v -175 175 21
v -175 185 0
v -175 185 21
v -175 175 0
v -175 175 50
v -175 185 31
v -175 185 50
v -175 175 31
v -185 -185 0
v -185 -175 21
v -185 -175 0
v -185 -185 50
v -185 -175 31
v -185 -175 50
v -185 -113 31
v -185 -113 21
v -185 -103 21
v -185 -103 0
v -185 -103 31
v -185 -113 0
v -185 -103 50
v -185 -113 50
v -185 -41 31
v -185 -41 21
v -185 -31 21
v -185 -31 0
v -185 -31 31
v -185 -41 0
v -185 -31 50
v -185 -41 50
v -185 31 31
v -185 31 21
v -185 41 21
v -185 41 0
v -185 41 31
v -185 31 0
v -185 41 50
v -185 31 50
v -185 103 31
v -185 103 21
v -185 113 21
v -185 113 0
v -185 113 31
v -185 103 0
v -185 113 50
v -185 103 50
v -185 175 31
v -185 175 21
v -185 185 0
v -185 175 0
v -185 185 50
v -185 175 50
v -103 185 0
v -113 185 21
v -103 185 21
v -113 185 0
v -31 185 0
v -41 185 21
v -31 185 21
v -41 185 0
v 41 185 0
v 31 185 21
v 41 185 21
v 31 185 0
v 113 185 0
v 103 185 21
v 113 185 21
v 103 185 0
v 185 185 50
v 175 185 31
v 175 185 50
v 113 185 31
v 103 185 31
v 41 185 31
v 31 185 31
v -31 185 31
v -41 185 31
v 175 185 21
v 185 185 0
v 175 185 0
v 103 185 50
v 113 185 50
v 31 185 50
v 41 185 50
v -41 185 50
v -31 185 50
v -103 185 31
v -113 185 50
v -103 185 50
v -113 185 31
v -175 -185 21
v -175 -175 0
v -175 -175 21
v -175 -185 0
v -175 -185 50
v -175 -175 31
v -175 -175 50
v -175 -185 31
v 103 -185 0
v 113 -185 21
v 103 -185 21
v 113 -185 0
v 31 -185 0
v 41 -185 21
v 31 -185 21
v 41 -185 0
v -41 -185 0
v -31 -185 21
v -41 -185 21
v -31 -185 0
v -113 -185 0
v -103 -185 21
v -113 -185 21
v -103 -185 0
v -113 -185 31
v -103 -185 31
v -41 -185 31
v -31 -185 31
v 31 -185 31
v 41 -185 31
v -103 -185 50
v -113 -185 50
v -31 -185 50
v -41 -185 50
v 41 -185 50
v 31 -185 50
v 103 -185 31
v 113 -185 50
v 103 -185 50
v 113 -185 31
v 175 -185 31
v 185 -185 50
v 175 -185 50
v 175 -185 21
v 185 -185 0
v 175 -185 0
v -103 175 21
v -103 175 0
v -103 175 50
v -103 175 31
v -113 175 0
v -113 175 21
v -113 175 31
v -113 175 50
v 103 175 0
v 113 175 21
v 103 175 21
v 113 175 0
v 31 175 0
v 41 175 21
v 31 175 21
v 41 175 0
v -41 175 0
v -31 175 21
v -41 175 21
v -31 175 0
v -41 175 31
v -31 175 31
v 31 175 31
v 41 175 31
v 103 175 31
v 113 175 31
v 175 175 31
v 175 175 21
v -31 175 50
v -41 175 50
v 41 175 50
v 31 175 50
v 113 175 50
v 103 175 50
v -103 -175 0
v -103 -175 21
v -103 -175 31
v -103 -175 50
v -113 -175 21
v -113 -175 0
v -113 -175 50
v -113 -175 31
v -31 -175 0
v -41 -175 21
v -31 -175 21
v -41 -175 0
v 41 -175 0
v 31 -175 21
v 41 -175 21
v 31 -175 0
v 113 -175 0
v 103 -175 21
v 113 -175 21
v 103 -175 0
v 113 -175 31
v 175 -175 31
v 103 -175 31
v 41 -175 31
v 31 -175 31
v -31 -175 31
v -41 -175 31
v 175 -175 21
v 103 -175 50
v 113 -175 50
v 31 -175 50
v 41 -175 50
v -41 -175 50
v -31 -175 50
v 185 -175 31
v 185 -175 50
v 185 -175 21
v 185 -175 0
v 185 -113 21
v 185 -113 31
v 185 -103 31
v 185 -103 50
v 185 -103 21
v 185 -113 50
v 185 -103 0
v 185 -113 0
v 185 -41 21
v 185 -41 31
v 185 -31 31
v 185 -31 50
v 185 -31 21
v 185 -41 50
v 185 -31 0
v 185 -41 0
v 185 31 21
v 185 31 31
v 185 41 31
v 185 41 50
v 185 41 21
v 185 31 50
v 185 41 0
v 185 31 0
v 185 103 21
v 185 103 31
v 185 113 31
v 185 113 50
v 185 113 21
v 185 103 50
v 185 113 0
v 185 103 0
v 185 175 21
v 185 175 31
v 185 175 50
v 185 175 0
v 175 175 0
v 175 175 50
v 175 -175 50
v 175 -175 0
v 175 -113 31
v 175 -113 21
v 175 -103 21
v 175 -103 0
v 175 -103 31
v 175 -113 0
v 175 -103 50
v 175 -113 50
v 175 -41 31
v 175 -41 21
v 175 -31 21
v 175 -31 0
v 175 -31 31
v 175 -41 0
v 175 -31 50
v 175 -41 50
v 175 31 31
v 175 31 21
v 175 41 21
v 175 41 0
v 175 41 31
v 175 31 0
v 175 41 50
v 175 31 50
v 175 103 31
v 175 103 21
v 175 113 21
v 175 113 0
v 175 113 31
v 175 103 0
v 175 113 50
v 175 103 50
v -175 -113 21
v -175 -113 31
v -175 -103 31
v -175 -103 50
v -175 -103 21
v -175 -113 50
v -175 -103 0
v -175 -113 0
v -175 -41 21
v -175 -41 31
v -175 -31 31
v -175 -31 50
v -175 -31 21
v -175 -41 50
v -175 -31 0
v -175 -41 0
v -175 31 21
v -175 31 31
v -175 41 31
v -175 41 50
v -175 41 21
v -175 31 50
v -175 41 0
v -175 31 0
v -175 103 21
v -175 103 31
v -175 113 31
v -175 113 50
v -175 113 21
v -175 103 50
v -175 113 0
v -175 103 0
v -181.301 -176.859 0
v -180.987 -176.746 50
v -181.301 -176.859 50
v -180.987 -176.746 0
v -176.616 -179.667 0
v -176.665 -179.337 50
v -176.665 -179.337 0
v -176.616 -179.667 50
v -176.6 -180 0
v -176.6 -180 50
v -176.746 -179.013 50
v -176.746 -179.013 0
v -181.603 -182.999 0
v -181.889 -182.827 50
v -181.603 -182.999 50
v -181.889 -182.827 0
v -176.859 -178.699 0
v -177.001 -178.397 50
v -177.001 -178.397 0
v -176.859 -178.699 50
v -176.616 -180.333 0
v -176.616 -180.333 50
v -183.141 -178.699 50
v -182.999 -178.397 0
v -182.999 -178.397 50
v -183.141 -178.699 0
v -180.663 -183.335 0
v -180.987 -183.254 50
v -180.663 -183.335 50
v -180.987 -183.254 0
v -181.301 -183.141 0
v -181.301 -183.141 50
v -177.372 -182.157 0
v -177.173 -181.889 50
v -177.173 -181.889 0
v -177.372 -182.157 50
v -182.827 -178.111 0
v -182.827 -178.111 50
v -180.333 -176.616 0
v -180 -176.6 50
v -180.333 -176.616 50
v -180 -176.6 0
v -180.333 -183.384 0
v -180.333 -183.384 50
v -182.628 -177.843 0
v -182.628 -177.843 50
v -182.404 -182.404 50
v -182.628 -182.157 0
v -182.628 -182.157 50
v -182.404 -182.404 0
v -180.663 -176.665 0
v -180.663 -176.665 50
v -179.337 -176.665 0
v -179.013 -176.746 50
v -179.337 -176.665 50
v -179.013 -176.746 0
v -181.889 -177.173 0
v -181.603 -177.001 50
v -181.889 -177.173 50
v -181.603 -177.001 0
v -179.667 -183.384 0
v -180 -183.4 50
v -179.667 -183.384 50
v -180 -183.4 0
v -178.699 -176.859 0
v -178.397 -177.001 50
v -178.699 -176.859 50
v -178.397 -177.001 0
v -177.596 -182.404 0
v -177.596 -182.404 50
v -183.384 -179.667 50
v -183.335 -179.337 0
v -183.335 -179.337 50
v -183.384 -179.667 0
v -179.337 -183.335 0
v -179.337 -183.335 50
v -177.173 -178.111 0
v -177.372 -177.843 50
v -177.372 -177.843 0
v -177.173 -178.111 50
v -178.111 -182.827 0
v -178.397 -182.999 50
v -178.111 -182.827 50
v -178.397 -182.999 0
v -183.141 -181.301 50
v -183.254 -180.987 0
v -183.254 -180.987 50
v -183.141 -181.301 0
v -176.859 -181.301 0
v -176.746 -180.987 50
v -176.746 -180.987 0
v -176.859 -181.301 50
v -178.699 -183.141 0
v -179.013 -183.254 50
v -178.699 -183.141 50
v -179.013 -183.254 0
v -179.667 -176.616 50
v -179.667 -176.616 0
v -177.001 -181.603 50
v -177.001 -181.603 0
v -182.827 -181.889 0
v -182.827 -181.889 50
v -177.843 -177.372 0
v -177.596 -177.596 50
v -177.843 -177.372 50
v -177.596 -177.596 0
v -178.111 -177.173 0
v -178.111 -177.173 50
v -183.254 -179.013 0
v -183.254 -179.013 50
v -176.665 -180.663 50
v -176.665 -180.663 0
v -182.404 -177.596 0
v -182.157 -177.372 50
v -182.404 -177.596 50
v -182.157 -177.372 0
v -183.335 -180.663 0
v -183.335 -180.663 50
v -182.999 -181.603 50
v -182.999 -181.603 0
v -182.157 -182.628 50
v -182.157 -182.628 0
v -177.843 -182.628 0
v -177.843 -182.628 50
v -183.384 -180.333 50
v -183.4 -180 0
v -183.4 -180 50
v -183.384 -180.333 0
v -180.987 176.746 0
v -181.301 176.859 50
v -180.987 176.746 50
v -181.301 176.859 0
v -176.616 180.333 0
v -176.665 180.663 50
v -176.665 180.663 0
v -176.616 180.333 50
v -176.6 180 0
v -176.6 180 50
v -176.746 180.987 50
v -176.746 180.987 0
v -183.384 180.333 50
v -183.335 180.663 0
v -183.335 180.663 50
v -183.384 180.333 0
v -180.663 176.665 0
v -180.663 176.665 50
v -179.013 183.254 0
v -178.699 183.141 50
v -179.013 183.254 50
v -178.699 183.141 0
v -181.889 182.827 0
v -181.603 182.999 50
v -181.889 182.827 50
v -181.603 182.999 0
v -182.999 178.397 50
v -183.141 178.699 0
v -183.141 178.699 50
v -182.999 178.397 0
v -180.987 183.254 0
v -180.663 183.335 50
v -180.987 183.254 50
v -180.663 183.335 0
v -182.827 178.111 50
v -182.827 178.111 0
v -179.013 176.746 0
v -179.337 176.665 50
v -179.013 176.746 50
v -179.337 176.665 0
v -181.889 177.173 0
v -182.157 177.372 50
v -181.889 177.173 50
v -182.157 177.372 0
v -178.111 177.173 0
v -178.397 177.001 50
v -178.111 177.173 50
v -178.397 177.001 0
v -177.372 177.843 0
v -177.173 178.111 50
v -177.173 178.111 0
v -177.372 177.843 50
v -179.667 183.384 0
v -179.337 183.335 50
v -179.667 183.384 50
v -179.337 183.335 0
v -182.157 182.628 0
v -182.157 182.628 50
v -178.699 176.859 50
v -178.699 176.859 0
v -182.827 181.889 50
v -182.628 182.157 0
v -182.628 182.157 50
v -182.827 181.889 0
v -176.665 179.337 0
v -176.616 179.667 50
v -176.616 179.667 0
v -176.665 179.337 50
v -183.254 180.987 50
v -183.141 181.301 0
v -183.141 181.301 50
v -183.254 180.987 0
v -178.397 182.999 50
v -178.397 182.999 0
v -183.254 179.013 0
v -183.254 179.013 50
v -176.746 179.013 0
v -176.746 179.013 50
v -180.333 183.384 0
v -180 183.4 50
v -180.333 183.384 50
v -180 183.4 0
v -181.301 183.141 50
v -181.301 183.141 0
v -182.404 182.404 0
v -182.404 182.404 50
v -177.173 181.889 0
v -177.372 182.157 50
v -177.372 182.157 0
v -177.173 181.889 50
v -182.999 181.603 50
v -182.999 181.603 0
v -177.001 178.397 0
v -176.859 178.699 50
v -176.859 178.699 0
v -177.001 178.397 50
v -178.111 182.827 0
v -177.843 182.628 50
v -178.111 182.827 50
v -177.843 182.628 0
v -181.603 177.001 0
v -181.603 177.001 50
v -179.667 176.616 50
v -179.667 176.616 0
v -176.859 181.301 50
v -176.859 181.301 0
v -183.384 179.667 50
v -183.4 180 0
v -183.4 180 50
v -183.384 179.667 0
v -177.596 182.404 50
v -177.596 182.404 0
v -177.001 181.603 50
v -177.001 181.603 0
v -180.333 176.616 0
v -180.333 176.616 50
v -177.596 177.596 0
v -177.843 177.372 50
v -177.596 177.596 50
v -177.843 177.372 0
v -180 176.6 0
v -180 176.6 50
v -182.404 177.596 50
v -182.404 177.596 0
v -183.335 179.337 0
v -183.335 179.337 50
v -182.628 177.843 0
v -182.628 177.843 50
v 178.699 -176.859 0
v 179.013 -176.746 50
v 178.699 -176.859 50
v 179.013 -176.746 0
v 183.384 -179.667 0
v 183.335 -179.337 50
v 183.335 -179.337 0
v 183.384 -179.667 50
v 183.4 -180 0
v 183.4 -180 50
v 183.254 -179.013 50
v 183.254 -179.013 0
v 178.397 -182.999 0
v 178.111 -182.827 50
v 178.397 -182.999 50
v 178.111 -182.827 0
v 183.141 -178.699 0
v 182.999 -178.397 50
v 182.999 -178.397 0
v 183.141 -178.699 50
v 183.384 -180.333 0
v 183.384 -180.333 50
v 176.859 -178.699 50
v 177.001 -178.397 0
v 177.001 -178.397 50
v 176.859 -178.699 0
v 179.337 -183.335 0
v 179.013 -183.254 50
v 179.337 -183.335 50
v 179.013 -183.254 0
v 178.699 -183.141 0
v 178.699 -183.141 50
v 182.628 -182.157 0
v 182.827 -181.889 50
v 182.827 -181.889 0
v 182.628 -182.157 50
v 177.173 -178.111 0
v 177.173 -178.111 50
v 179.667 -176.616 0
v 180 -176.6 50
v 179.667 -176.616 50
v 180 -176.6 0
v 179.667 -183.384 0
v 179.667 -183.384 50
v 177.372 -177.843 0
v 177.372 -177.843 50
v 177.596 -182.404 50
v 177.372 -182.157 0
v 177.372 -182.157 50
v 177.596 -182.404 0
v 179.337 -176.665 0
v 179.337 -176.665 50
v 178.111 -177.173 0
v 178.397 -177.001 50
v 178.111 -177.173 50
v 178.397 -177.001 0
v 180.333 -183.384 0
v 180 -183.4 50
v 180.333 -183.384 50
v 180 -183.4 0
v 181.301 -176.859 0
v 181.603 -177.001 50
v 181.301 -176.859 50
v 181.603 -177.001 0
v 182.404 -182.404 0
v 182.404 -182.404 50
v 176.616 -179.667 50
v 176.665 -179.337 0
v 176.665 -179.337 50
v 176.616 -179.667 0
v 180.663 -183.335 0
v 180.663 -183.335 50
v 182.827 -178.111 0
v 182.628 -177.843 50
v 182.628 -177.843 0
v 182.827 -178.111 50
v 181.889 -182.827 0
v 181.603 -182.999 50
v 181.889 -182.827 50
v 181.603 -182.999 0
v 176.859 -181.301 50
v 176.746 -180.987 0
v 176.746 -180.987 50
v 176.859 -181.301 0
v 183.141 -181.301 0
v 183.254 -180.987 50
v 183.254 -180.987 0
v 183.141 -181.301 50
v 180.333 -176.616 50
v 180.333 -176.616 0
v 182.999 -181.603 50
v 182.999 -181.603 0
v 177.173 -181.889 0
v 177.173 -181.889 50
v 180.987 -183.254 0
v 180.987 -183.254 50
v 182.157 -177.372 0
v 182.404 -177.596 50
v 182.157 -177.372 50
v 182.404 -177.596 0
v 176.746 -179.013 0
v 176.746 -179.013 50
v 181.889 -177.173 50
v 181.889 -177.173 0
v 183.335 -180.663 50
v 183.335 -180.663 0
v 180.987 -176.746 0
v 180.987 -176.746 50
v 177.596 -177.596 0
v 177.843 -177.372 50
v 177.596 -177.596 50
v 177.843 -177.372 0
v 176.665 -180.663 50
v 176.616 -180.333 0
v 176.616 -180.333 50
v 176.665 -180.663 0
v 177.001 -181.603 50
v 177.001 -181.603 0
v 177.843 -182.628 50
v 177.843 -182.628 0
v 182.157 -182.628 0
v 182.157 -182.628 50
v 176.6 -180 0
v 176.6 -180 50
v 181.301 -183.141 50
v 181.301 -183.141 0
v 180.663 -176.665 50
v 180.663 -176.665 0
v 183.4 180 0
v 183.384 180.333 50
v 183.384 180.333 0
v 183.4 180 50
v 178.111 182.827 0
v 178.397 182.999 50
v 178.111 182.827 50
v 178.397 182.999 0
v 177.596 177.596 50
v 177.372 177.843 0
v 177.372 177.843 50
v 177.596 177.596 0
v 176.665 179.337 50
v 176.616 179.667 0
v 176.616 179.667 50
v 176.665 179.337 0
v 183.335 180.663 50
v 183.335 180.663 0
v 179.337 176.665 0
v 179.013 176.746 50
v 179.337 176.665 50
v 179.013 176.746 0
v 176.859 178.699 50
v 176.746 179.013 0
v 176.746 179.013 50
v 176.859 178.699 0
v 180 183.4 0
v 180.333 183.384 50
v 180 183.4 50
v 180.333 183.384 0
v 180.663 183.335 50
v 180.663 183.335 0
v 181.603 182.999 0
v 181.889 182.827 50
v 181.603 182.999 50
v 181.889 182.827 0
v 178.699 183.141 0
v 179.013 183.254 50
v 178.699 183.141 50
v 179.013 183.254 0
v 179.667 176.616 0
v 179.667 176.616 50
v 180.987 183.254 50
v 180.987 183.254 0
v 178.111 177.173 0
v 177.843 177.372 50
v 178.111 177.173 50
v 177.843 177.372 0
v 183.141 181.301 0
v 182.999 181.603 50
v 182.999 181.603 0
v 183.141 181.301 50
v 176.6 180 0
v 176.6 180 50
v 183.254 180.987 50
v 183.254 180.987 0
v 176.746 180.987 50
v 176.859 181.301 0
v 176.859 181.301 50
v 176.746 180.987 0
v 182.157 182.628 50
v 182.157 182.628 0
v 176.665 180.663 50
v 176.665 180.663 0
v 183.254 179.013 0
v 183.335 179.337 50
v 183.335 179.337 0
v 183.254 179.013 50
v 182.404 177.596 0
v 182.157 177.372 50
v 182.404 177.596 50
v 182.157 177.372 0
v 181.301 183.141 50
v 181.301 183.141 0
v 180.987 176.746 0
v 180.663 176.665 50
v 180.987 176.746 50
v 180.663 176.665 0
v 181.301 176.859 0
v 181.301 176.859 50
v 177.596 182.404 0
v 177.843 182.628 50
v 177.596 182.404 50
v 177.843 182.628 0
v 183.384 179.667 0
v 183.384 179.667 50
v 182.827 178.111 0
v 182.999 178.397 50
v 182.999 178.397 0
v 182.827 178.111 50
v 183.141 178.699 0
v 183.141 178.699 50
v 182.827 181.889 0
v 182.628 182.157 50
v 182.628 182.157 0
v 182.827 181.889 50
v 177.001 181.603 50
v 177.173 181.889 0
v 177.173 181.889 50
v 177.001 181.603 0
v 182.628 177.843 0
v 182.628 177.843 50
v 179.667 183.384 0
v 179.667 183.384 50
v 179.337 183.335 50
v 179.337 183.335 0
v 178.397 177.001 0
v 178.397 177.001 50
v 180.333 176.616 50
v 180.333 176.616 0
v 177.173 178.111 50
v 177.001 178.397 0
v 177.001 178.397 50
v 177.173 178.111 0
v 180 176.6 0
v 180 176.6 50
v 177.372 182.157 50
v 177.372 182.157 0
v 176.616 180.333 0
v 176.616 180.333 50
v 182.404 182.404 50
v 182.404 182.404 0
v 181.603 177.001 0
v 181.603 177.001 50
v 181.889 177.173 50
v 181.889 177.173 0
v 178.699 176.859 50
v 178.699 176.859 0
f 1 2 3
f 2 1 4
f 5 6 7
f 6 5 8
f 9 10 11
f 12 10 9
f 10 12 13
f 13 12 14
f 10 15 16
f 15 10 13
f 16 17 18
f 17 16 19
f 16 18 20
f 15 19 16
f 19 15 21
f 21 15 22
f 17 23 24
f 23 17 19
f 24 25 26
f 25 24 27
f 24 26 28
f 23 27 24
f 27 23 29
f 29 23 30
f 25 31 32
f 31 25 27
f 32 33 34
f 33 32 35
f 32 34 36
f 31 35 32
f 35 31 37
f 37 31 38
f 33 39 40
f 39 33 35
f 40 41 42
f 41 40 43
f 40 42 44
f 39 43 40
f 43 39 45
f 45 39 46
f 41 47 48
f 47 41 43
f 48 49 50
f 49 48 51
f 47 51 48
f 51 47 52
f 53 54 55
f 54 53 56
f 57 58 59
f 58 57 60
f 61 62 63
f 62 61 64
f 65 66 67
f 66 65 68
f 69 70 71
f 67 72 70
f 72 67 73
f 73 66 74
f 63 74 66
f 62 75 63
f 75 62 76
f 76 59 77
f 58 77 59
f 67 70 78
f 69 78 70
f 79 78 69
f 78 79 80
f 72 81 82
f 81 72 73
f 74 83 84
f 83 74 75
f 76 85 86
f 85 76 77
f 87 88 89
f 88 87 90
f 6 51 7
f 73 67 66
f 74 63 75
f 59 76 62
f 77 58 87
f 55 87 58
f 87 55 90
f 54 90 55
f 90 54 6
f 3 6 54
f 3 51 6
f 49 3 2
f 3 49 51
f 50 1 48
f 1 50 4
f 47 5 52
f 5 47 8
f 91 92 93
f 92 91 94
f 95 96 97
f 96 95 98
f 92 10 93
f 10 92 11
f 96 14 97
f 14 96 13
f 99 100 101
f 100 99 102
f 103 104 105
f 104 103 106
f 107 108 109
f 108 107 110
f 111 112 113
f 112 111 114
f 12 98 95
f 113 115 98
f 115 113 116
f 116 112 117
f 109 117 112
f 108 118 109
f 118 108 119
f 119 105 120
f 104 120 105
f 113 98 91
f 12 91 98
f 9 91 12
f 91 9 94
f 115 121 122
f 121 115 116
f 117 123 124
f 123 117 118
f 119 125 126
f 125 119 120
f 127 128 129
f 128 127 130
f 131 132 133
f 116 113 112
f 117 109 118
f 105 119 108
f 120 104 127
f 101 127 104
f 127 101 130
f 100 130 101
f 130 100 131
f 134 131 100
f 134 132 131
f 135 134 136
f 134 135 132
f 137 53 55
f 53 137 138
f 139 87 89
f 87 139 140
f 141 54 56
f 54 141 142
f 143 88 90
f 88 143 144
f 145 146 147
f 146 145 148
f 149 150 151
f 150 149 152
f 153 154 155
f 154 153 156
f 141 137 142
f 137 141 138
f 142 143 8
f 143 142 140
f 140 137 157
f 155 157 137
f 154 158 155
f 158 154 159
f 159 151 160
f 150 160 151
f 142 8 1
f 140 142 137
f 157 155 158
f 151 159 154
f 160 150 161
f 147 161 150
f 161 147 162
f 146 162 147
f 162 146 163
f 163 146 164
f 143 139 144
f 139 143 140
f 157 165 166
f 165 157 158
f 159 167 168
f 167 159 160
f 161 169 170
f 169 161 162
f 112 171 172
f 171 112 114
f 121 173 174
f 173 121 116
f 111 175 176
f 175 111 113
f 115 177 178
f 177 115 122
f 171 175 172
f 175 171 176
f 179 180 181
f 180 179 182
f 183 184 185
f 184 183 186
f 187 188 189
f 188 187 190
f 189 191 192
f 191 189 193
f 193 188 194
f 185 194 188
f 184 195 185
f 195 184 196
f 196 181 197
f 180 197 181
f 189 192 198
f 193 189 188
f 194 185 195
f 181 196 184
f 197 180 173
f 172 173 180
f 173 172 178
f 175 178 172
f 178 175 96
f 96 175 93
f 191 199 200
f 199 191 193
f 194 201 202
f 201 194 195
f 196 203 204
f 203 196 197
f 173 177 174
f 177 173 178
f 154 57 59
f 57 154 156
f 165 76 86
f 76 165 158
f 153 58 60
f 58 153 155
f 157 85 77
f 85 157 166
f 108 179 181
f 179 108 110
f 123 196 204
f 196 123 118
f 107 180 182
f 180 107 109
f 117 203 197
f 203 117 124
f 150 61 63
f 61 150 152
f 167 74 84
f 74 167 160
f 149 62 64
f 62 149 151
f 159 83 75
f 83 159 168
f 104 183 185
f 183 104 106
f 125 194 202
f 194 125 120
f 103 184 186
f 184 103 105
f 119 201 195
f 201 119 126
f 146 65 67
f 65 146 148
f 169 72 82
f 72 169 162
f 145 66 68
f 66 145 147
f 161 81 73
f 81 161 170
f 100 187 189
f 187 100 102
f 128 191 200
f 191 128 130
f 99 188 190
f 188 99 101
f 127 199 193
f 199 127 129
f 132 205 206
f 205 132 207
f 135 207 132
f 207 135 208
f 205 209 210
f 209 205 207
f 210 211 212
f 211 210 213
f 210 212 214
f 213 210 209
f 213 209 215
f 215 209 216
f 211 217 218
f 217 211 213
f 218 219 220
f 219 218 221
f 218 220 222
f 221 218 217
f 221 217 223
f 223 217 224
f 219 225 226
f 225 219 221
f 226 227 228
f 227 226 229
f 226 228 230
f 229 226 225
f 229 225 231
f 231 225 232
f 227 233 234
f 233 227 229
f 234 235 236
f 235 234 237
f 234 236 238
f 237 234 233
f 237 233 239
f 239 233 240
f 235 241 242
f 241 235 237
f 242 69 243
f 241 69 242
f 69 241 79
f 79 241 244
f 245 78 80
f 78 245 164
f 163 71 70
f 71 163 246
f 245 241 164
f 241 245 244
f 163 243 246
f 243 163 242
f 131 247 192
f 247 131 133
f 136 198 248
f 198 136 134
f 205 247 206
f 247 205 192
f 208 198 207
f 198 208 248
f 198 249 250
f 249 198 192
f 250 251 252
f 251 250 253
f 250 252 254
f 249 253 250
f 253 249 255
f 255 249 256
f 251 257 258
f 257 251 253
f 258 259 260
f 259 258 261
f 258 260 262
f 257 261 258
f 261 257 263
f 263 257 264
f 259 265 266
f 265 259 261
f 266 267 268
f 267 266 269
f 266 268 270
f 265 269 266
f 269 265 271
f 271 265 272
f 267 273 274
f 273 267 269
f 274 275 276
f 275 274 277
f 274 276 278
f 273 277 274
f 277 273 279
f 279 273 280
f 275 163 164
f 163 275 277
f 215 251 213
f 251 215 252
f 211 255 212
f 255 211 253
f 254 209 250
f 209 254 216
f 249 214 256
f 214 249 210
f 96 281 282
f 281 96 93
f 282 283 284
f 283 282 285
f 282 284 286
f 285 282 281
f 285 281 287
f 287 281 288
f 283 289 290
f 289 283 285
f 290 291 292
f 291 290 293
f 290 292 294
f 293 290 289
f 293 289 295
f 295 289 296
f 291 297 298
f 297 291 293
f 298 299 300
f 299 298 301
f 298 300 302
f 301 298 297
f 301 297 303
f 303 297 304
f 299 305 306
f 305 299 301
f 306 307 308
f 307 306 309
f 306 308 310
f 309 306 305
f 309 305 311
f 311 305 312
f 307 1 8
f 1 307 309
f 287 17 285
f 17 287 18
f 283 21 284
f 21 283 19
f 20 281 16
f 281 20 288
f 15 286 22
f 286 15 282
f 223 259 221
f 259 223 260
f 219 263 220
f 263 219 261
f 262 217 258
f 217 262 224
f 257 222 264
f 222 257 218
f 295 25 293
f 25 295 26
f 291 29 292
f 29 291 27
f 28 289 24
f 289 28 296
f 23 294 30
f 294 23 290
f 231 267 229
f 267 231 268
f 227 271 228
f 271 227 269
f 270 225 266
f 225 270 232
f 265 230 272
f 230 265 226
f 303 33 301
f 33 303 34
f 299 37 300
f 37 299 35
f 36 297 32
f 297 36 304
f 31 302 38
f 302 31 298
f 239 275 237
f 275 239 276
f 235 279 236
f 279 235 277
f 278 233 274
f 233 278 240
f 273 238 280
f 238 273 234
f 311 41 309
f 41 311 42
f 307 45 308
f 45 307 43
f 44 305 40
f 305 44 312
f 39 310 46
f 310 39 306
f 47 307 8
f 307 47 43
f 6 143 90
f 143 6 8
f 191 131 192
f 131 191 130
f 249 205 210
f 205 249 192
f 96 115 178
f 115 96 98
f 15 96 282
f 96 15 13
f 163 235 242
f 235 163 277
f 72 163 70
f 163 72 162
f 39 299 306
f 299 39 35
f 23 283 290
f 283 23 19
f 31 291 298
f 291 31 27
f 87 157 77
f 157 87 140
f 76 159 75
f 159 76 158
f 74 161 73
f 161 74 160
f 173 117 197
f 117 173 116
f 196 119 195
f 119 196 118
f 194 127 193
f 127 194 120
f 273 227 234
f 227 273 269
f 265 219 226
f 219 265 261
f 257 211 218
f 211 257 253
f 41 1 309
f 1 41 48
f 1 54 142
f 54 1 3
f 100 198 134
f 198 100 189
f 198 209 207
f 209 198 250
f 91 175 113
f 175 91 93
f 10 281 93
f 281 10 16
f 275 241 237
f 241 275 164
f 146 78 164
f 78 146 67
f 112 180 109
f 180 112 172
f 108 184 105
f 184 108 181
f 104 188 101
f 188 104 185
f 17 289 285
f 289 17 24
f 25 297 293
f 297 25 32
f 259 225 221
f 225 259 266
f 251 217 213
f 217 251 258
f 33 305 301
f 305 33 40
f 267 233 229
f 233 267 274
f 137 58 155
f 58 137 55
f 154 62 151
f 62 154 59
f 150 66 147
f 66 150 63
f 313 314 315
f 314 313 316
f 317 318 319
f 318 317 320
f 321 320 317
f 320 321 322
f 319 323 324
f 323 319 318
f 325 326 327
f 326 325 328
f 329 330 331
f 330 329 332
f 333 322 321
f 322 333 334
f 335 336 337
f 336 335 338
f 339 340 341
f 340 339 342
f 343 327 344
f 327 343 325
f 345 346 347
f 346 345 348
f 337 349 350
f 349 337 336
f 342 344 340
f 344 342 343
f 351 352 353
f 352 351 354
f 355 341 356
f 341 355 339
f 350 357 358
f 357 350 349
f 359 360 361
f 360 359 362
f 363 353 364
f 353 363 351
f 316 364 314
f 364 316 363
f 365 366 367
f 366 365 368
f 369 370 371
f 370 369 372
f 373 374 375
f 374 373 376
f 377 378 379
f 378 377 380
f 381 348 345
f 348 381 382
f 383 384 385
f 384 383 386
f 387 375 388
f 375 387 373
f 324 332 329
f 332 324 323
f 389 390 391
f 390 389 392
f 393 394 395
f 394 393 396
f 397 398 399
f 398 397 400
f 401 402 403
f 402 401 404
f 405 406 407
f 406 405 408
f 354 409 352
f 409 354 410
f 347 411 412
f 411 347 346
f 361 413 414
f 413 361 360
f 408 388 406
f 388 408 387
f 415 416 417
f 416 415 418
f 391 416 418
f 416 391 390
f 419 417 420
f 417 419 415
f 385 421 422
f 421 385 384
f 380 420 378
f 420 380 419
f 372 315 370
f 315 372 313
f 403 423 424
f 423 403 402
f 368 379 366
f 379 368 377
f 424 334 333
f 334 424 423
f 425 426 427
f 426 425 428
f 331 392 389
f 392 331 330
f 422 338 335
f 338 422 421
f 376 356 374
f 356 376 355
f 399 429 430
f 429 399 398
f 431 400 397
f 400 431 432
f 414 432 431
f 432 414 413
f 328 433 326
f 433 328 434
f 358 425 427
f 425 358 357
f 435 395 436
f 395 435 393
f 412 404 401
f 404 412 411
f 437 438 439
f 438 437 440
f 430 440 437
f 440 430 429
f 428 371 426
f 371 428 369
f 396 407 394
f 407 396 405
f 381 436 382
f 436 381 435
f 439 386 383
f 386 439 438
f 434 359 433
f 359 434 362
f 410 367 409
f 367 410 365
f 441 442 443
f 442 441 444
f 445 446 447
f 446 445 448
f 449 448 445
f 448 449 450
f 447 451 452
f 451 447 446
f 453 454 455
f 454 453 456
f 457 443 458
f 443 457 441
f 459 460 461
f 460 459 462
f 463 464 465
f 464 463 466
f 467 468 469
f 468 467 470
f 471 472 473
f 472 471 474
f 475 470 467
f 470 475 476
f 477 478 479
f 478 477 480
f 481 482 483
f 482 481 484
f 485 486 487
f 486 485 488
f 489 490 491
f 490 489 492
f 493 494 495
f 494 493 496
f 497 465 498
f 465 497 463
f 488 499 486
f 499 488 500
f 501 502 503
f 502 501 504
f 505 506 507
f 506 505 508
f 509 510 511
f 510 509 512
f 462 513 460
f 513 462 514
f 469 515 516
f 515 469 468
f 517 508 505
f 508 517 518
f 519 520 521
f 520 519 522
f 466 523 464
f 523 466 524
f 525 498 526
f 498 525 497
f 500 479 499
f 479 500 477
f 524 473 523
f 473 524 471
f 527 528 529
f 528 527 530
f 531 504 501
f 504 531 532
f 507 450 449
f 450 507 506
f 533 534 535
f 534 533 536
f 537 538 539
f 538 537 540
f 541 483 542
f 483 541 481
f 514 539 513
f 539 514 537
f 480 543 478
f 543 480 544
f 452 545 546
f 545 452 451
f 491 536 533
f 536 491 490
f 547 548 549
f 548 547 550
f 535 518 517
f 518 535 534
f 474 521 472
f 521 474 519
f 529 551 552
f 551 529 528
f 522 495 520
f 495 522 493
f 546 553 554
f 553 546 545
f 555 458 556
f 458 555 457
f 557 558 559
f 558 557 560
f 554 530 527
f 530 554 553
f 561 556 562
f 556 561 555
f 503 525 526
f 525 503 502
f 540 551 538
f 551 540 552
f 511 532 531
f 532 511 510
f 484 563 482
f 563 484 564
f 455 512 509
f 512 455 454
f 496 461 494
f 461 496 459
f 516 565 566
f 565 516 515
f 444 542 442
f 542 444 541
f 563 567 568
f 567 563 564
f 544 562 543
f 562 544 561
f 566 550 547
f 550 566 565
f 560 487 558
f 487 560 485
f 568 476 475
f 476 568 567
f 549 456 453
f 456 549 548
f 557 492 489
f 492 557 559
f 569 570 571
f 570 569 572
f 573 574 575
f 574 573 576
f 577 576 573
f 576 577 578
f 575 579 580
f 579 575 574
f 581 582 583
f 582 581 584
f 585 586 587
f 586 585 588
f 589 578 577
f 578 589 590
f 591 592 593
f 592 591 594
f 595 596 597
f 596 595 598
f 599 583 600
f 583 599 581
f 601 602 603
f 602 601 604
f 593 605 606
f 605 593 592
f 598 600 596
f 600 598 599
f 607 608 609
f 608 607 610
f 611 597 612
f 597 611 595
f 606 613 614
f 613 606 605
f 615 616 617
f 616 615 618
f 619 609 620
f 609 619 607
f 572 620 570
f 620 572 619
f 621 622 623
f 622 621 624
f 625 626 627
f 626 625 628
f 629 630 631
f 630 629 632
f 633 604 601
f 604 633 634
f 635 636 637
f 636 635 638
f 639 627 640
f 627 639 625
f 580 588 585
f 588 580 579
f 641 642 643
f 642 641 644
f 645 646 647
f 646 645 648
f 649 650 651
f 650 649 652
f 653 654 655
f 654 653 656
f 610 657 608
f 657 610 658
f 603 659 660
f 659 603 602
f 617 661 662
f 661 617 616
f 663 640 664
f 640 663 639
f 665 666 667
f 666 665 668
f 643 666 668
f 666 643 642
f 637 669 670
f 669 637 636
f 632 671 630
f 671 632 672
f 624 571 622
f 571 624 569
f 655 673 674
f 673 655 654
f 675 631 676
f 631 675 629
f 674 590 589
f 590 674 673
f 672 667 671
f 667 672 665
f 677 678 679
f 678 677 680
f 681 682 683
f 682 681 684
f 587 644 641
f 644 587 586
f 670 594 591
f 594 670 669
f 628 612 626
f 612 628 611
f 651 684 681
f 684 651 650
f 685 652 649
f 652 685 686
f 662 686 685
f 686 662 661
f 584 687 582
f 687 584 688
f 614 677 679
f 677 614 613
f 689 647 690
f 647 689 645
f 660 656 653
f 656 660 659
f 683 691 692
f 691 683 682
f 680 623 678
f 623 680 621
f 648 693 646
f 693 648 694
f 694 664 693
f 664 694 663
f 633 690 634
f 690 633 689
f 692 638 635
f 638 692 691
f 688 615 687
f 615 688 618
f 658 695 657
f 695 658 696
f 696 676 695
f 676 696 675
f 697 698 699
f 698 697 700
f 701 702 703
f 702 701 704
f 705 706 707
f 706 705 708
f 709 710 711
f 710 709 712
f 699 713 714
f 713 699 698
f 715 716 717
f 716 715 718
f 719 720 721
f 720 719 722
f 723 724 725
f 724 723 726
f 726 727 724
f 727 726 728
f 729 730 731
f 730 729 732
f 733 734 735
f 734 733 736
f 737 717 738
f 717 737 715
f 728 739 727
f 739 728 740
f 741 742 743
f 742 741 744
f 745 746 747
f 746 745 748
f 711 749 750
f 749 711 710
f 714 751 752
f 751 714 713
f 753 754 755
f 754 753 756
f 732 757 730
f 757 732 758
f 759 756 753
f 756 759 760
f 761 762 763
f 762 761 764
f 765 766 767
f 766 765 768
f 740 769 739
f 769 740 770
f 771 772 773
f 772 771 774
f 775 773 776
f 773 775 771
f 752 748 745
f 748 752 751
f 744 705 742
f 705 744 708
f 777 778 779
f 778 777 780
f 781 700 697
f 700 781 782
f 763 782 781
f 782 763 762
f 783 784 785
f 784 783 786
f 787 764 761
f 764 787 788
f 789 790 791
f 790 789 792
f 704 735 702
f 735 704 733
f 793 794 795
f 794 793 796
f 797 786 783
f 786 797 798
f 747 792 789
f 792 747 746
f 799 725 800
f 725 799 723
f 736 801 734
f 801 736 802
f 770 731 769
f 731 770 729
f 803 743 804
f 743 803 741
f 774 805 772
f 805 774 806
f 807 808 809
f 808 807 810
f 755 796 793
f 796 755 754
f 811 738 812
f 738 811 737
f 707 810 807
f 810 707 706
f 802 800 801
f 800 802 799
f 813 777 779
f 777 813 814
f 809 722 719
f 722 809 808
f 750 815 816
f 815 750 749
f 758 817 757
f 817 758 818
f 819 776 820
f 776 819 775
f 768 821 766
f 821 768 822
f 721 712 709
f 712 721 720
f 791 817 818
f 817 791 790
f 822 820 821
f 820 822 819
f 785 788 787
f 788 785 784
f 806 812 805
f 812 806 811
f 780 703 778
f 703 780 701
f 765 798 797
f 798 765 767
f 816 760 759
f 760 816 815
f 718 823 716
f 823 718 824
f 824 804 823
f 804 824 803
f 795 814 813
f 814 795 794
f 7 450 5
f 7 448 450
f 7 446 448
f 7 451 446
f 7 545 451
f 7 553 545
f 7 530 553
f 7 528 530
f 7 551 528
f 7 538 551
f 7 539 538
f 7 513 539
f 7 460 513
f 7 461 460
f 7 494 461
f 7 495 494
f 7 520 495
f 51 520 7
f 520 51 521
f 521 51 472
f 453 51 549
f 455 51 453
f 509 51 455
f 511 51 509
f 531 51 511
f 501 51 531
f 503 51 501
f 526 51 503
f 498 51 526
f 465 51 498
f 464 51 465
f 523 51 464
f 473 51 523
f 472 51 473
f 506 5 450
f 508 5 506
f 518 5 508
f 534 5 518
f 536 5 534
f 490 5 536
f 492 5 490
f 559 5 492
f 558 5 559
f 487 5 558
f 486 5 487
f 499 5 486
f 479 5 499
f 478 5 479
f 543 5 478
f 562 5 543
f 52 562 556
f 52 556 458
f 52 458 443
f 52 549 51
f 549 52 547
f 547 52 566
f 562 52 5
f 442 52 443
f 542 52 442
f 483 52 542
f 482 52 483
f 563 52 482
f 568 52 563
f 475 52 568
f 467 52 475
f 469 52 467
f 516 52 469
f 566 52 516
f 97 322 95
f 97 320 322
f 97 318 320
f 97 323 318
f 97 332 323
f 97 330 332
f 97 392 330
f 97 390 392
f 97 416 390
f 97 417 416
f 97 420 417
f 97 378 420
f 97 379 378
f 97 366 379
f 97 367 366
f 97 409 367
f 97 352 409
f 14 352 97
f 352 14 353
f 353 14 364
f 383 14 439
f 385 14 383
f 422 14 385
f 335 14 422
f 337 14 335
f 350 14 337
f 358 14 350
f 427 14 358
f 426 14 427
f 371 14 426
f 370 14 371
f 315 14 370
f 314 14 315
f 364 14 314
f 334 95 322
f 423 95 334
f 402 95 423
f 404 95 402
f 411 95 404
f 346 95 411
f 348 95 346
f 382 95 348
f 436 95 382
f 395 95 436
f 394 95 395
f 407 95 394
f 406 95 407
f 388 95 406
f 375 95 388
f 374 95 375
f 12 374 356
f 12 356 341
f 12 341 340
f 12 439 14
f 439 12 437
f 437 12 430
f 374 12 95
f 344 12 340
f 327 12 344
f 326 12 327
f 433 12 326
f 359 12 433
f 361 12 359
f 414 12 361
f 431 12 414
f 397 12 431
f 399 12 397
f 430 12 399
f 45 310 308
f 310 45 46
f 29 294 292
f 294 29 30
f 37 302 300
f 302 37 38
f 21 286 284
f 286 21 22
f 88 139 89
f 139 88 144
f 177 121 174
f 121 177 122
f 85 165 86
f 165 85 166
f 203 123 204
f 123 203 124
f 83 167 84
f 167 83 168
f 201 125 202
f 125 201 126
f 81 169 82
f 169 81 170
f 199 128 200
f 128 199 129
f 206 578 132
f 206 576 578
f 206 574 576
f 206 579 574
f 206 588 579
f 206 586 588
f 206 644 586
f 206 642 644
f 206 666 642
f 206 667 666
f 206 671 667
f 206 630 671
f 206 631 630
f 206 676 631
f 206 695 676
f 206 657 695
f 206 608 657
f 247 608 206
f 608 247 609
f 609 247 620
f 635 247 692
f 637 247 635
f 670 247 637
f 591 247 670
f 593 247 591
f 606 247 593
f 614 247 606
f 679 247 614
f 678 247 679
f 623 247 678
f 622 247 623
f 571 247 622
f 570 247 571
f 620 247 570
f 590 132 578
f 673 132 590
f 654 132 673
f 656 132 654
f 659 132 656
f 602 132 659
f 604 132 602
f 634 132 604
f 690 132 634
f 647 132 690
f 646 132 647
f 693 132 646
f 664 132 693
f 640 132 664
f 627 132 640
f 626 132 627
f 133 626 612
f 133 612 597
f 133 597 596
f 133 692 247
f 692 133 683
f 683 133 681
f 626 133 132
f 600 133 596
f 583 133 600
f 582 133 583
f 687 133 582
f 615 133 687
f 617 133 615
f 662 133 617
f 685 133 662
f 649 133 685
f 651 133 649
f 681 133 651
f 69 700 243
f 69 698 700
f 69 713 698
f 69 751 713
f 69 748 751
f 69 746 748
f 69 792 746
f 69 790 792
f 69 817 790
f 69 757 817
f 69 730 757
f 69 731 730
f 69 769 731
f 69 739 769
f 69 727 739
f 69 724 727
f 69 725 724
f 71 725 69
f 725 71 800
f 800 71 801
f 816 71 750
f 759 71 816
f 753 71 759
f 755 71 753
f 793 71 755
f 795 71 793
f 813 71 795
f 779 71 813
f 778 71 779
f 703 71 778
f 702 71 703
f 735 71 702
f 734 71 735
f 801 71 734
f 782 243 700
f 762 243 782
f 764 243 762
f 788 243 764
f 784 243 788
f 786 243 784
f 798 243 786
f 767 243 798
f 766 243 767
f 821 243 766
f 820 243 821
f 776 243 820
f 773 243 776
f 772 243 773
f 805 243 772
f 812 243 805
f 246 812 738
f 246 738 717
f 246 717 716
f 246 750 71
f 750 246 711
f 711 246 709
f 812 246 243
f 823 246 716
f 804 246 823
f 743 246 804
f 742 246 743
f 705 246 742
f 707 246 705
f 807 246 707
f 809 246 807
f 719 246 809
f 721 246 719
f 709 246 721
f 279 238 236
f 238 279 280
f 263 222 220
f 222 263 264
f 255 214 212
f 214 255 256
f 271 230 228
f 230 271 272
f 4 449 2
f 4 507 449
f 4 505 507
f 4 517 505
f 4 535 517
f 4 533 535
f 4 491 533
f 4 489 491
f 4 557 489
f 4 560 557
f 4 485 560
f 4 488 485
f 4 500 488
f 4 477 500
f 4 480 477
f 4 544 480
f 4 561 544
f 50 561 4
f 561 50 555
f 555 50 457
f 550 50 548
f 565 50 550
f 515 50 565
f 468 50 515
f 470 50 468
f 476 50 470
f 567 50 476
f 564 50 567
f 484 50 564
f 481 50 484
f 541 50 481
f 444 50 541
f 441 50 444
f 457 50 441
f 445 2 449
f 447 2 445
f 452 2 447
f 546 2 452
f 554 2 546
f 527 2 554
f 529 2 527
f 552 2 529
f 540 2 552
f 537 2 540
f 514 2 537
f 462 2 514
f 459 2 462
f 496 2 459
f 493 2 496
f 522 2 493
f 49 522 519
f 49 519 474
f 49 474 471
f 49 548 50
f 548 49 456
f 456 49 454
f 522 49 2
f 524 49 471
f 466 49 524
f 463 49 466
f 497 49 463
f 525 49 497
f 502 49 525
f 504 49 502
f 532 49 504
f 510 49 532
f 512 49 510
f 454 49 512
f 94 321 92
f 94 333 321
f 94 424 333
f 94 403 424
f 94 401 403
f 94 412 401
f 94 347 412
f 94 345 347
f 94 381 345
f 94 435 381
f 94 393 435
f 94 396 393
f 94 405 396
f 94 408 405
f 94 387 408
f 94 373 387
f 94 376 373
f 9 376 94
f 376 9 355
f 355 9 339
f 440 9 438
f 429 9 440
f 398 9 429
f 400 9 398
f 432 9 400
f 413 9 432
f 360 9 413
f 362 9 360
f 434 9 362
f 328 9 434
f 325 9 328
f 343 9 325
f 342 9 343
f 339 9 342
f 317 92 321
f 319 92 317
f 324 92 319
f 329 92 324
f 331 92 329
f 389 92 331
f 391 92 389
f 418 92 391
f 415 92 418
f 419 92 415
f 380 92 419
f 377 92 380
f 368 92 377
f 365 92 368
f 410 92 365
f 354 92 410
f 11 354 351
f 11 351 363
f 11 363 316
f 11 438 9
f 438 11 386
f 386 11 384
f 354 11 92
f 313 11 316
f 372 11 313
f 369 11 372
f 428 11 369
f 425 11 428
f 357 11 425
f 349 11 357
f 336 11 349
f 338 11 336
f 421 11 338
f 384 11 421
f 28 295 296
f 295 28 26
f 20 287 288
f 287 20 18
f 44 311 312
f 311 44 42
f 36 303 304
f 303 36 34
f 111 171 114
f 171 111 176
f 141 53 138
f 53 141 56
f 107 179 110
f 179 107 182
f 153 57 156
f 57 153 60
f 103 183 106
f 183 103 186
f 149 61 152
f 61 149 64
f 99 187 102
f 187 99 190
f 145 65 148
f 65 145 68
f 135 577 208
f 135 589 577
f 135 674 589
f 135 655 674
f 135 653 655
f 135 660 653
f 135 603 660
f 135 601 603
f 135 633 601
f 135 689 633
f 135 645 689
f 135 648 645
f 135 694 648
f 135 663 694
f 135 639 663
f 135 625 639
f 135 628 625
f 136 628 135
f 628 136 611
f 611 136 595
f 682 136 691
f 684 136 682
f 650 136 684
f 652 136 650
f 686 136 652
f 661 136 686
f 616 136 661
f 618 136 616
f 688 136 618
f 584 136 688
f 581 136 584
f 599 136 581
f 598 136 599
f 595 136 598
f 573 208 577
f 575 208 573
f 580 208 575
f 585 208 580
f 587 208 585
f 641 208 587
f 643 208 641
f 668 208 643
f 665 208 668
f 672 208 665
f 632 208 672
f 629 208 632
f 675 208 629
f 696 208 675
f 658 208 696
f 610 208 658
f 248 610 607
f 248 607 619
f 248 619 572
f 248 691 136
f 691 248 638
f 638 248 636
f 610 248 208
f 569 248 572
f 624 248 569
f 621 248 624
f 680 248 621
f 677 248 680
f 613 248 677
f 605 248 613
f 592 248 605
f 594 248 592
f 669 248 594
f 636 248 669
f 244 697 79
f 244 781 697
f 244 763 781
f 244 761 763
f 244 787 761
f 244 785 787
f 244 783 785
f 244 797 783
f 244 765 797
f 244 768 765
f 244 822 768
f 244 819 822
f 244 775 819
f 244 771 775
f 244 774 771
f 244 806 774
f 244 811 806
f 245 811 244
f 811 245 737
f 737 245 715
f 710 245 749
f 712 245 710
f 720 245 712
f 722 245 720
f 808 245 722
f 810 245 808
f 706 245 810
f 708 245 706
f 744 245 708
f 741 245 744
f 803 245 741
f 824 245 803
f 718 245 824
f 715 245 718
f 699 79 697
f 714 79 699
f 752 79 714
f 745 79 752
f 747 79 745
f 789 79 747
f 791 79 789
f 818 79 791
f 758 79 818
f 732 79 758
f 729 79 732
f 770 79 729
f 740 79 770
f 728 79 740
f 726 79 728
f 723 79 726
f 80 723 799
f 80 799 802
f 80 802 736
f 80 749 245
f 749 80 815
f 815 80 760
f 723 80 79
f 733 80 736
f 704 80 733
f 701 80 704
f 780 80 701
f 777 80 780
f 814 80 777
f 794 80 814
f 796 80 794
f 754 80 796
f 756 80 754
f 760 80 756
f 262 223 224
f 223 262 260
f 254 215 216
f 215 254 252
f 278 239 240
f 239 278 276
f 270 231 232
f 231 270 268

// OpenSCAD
// Cage slice part (z0..z1). Units: mm.
// Print orientation: normal

bar=10;
inner=[350,350,700];
gap_xy=62;
gap_z=61;
hole_d=6.8;
$fn=64;

outer=[inner[0]+2*bar, inner[1]+2*bar, inner[2]+2*bar];
half=[outer[0]/2, outer[1]/2, outer[2]/2];

pitch_xy=bar+gap_xy;
pitch_z=bar+gap_z;

centers=[for(i=[0:5]) -(half[0]-bar/2) + i*pitch_xy];
z_levels=[for(i=[0:10]) i*pitch_z];

module vbar(xc,yc){ translate([xc-bar/2,yc-bar/2,0]) cube([bar,bar,outer[2]],center=false); }
module hbar_x(yc,z0){ translate([-half[0],yc-bar/2,z0]) cube([outer[0],bar,bar],center=false); }
module hbar_y(xc,z0){ translate([xc-bar/2,-half[1],z0]) cube([bar,outer[1],bar],center=false); }

module grid(z0){ union(){ for(yc=centers) hbar_x(yc,z0); for(xc=centers) hbar_y(xc,z0); } }

module side_verticals(){
  union(){
    for(xc=centers){ vbar(xc, half[1]-bar/2); vbar(xc,-half[1]+bar/2); }
    for(yc=centers){ vbar( half[0]-bar/2,yc); vbar(-half[0]+bar/2,yc); }
  }
}

module side_rings(){
  union(){
    for(z0=z_levels){
      hbar_x( half[1]-bar/2,z0); hbar_x(-half[1]+bar/2,z0);
      hbar_y( half[0]-bar/2,z0); hbar_y(-half[0]+bar/2,z0);
    }
  }
}

module rod_holes(){
  for(sx=[-1,1],sy=[-1,1]) translate([sx*(half[0]-bar/2), sy*(half[1]-bar/2), -1]) cylinder(d=hole_d,h=outer[2]+2,center=false);
}

module cage(){ difference(){ union(){ side_verticals(); side_rings(); grid(0); grid(outer[2]-bar); } rod_holes(); } }

module cage_slice(zmin,zmax){ intersection(){ cage(); translate([-1000,-1000,zmin]) cube([2000,2000,zmax-zmin],center=false); } }

z0=547; z1=597;
translate([0,0,-z0]) cage_slice(z0,z1);
